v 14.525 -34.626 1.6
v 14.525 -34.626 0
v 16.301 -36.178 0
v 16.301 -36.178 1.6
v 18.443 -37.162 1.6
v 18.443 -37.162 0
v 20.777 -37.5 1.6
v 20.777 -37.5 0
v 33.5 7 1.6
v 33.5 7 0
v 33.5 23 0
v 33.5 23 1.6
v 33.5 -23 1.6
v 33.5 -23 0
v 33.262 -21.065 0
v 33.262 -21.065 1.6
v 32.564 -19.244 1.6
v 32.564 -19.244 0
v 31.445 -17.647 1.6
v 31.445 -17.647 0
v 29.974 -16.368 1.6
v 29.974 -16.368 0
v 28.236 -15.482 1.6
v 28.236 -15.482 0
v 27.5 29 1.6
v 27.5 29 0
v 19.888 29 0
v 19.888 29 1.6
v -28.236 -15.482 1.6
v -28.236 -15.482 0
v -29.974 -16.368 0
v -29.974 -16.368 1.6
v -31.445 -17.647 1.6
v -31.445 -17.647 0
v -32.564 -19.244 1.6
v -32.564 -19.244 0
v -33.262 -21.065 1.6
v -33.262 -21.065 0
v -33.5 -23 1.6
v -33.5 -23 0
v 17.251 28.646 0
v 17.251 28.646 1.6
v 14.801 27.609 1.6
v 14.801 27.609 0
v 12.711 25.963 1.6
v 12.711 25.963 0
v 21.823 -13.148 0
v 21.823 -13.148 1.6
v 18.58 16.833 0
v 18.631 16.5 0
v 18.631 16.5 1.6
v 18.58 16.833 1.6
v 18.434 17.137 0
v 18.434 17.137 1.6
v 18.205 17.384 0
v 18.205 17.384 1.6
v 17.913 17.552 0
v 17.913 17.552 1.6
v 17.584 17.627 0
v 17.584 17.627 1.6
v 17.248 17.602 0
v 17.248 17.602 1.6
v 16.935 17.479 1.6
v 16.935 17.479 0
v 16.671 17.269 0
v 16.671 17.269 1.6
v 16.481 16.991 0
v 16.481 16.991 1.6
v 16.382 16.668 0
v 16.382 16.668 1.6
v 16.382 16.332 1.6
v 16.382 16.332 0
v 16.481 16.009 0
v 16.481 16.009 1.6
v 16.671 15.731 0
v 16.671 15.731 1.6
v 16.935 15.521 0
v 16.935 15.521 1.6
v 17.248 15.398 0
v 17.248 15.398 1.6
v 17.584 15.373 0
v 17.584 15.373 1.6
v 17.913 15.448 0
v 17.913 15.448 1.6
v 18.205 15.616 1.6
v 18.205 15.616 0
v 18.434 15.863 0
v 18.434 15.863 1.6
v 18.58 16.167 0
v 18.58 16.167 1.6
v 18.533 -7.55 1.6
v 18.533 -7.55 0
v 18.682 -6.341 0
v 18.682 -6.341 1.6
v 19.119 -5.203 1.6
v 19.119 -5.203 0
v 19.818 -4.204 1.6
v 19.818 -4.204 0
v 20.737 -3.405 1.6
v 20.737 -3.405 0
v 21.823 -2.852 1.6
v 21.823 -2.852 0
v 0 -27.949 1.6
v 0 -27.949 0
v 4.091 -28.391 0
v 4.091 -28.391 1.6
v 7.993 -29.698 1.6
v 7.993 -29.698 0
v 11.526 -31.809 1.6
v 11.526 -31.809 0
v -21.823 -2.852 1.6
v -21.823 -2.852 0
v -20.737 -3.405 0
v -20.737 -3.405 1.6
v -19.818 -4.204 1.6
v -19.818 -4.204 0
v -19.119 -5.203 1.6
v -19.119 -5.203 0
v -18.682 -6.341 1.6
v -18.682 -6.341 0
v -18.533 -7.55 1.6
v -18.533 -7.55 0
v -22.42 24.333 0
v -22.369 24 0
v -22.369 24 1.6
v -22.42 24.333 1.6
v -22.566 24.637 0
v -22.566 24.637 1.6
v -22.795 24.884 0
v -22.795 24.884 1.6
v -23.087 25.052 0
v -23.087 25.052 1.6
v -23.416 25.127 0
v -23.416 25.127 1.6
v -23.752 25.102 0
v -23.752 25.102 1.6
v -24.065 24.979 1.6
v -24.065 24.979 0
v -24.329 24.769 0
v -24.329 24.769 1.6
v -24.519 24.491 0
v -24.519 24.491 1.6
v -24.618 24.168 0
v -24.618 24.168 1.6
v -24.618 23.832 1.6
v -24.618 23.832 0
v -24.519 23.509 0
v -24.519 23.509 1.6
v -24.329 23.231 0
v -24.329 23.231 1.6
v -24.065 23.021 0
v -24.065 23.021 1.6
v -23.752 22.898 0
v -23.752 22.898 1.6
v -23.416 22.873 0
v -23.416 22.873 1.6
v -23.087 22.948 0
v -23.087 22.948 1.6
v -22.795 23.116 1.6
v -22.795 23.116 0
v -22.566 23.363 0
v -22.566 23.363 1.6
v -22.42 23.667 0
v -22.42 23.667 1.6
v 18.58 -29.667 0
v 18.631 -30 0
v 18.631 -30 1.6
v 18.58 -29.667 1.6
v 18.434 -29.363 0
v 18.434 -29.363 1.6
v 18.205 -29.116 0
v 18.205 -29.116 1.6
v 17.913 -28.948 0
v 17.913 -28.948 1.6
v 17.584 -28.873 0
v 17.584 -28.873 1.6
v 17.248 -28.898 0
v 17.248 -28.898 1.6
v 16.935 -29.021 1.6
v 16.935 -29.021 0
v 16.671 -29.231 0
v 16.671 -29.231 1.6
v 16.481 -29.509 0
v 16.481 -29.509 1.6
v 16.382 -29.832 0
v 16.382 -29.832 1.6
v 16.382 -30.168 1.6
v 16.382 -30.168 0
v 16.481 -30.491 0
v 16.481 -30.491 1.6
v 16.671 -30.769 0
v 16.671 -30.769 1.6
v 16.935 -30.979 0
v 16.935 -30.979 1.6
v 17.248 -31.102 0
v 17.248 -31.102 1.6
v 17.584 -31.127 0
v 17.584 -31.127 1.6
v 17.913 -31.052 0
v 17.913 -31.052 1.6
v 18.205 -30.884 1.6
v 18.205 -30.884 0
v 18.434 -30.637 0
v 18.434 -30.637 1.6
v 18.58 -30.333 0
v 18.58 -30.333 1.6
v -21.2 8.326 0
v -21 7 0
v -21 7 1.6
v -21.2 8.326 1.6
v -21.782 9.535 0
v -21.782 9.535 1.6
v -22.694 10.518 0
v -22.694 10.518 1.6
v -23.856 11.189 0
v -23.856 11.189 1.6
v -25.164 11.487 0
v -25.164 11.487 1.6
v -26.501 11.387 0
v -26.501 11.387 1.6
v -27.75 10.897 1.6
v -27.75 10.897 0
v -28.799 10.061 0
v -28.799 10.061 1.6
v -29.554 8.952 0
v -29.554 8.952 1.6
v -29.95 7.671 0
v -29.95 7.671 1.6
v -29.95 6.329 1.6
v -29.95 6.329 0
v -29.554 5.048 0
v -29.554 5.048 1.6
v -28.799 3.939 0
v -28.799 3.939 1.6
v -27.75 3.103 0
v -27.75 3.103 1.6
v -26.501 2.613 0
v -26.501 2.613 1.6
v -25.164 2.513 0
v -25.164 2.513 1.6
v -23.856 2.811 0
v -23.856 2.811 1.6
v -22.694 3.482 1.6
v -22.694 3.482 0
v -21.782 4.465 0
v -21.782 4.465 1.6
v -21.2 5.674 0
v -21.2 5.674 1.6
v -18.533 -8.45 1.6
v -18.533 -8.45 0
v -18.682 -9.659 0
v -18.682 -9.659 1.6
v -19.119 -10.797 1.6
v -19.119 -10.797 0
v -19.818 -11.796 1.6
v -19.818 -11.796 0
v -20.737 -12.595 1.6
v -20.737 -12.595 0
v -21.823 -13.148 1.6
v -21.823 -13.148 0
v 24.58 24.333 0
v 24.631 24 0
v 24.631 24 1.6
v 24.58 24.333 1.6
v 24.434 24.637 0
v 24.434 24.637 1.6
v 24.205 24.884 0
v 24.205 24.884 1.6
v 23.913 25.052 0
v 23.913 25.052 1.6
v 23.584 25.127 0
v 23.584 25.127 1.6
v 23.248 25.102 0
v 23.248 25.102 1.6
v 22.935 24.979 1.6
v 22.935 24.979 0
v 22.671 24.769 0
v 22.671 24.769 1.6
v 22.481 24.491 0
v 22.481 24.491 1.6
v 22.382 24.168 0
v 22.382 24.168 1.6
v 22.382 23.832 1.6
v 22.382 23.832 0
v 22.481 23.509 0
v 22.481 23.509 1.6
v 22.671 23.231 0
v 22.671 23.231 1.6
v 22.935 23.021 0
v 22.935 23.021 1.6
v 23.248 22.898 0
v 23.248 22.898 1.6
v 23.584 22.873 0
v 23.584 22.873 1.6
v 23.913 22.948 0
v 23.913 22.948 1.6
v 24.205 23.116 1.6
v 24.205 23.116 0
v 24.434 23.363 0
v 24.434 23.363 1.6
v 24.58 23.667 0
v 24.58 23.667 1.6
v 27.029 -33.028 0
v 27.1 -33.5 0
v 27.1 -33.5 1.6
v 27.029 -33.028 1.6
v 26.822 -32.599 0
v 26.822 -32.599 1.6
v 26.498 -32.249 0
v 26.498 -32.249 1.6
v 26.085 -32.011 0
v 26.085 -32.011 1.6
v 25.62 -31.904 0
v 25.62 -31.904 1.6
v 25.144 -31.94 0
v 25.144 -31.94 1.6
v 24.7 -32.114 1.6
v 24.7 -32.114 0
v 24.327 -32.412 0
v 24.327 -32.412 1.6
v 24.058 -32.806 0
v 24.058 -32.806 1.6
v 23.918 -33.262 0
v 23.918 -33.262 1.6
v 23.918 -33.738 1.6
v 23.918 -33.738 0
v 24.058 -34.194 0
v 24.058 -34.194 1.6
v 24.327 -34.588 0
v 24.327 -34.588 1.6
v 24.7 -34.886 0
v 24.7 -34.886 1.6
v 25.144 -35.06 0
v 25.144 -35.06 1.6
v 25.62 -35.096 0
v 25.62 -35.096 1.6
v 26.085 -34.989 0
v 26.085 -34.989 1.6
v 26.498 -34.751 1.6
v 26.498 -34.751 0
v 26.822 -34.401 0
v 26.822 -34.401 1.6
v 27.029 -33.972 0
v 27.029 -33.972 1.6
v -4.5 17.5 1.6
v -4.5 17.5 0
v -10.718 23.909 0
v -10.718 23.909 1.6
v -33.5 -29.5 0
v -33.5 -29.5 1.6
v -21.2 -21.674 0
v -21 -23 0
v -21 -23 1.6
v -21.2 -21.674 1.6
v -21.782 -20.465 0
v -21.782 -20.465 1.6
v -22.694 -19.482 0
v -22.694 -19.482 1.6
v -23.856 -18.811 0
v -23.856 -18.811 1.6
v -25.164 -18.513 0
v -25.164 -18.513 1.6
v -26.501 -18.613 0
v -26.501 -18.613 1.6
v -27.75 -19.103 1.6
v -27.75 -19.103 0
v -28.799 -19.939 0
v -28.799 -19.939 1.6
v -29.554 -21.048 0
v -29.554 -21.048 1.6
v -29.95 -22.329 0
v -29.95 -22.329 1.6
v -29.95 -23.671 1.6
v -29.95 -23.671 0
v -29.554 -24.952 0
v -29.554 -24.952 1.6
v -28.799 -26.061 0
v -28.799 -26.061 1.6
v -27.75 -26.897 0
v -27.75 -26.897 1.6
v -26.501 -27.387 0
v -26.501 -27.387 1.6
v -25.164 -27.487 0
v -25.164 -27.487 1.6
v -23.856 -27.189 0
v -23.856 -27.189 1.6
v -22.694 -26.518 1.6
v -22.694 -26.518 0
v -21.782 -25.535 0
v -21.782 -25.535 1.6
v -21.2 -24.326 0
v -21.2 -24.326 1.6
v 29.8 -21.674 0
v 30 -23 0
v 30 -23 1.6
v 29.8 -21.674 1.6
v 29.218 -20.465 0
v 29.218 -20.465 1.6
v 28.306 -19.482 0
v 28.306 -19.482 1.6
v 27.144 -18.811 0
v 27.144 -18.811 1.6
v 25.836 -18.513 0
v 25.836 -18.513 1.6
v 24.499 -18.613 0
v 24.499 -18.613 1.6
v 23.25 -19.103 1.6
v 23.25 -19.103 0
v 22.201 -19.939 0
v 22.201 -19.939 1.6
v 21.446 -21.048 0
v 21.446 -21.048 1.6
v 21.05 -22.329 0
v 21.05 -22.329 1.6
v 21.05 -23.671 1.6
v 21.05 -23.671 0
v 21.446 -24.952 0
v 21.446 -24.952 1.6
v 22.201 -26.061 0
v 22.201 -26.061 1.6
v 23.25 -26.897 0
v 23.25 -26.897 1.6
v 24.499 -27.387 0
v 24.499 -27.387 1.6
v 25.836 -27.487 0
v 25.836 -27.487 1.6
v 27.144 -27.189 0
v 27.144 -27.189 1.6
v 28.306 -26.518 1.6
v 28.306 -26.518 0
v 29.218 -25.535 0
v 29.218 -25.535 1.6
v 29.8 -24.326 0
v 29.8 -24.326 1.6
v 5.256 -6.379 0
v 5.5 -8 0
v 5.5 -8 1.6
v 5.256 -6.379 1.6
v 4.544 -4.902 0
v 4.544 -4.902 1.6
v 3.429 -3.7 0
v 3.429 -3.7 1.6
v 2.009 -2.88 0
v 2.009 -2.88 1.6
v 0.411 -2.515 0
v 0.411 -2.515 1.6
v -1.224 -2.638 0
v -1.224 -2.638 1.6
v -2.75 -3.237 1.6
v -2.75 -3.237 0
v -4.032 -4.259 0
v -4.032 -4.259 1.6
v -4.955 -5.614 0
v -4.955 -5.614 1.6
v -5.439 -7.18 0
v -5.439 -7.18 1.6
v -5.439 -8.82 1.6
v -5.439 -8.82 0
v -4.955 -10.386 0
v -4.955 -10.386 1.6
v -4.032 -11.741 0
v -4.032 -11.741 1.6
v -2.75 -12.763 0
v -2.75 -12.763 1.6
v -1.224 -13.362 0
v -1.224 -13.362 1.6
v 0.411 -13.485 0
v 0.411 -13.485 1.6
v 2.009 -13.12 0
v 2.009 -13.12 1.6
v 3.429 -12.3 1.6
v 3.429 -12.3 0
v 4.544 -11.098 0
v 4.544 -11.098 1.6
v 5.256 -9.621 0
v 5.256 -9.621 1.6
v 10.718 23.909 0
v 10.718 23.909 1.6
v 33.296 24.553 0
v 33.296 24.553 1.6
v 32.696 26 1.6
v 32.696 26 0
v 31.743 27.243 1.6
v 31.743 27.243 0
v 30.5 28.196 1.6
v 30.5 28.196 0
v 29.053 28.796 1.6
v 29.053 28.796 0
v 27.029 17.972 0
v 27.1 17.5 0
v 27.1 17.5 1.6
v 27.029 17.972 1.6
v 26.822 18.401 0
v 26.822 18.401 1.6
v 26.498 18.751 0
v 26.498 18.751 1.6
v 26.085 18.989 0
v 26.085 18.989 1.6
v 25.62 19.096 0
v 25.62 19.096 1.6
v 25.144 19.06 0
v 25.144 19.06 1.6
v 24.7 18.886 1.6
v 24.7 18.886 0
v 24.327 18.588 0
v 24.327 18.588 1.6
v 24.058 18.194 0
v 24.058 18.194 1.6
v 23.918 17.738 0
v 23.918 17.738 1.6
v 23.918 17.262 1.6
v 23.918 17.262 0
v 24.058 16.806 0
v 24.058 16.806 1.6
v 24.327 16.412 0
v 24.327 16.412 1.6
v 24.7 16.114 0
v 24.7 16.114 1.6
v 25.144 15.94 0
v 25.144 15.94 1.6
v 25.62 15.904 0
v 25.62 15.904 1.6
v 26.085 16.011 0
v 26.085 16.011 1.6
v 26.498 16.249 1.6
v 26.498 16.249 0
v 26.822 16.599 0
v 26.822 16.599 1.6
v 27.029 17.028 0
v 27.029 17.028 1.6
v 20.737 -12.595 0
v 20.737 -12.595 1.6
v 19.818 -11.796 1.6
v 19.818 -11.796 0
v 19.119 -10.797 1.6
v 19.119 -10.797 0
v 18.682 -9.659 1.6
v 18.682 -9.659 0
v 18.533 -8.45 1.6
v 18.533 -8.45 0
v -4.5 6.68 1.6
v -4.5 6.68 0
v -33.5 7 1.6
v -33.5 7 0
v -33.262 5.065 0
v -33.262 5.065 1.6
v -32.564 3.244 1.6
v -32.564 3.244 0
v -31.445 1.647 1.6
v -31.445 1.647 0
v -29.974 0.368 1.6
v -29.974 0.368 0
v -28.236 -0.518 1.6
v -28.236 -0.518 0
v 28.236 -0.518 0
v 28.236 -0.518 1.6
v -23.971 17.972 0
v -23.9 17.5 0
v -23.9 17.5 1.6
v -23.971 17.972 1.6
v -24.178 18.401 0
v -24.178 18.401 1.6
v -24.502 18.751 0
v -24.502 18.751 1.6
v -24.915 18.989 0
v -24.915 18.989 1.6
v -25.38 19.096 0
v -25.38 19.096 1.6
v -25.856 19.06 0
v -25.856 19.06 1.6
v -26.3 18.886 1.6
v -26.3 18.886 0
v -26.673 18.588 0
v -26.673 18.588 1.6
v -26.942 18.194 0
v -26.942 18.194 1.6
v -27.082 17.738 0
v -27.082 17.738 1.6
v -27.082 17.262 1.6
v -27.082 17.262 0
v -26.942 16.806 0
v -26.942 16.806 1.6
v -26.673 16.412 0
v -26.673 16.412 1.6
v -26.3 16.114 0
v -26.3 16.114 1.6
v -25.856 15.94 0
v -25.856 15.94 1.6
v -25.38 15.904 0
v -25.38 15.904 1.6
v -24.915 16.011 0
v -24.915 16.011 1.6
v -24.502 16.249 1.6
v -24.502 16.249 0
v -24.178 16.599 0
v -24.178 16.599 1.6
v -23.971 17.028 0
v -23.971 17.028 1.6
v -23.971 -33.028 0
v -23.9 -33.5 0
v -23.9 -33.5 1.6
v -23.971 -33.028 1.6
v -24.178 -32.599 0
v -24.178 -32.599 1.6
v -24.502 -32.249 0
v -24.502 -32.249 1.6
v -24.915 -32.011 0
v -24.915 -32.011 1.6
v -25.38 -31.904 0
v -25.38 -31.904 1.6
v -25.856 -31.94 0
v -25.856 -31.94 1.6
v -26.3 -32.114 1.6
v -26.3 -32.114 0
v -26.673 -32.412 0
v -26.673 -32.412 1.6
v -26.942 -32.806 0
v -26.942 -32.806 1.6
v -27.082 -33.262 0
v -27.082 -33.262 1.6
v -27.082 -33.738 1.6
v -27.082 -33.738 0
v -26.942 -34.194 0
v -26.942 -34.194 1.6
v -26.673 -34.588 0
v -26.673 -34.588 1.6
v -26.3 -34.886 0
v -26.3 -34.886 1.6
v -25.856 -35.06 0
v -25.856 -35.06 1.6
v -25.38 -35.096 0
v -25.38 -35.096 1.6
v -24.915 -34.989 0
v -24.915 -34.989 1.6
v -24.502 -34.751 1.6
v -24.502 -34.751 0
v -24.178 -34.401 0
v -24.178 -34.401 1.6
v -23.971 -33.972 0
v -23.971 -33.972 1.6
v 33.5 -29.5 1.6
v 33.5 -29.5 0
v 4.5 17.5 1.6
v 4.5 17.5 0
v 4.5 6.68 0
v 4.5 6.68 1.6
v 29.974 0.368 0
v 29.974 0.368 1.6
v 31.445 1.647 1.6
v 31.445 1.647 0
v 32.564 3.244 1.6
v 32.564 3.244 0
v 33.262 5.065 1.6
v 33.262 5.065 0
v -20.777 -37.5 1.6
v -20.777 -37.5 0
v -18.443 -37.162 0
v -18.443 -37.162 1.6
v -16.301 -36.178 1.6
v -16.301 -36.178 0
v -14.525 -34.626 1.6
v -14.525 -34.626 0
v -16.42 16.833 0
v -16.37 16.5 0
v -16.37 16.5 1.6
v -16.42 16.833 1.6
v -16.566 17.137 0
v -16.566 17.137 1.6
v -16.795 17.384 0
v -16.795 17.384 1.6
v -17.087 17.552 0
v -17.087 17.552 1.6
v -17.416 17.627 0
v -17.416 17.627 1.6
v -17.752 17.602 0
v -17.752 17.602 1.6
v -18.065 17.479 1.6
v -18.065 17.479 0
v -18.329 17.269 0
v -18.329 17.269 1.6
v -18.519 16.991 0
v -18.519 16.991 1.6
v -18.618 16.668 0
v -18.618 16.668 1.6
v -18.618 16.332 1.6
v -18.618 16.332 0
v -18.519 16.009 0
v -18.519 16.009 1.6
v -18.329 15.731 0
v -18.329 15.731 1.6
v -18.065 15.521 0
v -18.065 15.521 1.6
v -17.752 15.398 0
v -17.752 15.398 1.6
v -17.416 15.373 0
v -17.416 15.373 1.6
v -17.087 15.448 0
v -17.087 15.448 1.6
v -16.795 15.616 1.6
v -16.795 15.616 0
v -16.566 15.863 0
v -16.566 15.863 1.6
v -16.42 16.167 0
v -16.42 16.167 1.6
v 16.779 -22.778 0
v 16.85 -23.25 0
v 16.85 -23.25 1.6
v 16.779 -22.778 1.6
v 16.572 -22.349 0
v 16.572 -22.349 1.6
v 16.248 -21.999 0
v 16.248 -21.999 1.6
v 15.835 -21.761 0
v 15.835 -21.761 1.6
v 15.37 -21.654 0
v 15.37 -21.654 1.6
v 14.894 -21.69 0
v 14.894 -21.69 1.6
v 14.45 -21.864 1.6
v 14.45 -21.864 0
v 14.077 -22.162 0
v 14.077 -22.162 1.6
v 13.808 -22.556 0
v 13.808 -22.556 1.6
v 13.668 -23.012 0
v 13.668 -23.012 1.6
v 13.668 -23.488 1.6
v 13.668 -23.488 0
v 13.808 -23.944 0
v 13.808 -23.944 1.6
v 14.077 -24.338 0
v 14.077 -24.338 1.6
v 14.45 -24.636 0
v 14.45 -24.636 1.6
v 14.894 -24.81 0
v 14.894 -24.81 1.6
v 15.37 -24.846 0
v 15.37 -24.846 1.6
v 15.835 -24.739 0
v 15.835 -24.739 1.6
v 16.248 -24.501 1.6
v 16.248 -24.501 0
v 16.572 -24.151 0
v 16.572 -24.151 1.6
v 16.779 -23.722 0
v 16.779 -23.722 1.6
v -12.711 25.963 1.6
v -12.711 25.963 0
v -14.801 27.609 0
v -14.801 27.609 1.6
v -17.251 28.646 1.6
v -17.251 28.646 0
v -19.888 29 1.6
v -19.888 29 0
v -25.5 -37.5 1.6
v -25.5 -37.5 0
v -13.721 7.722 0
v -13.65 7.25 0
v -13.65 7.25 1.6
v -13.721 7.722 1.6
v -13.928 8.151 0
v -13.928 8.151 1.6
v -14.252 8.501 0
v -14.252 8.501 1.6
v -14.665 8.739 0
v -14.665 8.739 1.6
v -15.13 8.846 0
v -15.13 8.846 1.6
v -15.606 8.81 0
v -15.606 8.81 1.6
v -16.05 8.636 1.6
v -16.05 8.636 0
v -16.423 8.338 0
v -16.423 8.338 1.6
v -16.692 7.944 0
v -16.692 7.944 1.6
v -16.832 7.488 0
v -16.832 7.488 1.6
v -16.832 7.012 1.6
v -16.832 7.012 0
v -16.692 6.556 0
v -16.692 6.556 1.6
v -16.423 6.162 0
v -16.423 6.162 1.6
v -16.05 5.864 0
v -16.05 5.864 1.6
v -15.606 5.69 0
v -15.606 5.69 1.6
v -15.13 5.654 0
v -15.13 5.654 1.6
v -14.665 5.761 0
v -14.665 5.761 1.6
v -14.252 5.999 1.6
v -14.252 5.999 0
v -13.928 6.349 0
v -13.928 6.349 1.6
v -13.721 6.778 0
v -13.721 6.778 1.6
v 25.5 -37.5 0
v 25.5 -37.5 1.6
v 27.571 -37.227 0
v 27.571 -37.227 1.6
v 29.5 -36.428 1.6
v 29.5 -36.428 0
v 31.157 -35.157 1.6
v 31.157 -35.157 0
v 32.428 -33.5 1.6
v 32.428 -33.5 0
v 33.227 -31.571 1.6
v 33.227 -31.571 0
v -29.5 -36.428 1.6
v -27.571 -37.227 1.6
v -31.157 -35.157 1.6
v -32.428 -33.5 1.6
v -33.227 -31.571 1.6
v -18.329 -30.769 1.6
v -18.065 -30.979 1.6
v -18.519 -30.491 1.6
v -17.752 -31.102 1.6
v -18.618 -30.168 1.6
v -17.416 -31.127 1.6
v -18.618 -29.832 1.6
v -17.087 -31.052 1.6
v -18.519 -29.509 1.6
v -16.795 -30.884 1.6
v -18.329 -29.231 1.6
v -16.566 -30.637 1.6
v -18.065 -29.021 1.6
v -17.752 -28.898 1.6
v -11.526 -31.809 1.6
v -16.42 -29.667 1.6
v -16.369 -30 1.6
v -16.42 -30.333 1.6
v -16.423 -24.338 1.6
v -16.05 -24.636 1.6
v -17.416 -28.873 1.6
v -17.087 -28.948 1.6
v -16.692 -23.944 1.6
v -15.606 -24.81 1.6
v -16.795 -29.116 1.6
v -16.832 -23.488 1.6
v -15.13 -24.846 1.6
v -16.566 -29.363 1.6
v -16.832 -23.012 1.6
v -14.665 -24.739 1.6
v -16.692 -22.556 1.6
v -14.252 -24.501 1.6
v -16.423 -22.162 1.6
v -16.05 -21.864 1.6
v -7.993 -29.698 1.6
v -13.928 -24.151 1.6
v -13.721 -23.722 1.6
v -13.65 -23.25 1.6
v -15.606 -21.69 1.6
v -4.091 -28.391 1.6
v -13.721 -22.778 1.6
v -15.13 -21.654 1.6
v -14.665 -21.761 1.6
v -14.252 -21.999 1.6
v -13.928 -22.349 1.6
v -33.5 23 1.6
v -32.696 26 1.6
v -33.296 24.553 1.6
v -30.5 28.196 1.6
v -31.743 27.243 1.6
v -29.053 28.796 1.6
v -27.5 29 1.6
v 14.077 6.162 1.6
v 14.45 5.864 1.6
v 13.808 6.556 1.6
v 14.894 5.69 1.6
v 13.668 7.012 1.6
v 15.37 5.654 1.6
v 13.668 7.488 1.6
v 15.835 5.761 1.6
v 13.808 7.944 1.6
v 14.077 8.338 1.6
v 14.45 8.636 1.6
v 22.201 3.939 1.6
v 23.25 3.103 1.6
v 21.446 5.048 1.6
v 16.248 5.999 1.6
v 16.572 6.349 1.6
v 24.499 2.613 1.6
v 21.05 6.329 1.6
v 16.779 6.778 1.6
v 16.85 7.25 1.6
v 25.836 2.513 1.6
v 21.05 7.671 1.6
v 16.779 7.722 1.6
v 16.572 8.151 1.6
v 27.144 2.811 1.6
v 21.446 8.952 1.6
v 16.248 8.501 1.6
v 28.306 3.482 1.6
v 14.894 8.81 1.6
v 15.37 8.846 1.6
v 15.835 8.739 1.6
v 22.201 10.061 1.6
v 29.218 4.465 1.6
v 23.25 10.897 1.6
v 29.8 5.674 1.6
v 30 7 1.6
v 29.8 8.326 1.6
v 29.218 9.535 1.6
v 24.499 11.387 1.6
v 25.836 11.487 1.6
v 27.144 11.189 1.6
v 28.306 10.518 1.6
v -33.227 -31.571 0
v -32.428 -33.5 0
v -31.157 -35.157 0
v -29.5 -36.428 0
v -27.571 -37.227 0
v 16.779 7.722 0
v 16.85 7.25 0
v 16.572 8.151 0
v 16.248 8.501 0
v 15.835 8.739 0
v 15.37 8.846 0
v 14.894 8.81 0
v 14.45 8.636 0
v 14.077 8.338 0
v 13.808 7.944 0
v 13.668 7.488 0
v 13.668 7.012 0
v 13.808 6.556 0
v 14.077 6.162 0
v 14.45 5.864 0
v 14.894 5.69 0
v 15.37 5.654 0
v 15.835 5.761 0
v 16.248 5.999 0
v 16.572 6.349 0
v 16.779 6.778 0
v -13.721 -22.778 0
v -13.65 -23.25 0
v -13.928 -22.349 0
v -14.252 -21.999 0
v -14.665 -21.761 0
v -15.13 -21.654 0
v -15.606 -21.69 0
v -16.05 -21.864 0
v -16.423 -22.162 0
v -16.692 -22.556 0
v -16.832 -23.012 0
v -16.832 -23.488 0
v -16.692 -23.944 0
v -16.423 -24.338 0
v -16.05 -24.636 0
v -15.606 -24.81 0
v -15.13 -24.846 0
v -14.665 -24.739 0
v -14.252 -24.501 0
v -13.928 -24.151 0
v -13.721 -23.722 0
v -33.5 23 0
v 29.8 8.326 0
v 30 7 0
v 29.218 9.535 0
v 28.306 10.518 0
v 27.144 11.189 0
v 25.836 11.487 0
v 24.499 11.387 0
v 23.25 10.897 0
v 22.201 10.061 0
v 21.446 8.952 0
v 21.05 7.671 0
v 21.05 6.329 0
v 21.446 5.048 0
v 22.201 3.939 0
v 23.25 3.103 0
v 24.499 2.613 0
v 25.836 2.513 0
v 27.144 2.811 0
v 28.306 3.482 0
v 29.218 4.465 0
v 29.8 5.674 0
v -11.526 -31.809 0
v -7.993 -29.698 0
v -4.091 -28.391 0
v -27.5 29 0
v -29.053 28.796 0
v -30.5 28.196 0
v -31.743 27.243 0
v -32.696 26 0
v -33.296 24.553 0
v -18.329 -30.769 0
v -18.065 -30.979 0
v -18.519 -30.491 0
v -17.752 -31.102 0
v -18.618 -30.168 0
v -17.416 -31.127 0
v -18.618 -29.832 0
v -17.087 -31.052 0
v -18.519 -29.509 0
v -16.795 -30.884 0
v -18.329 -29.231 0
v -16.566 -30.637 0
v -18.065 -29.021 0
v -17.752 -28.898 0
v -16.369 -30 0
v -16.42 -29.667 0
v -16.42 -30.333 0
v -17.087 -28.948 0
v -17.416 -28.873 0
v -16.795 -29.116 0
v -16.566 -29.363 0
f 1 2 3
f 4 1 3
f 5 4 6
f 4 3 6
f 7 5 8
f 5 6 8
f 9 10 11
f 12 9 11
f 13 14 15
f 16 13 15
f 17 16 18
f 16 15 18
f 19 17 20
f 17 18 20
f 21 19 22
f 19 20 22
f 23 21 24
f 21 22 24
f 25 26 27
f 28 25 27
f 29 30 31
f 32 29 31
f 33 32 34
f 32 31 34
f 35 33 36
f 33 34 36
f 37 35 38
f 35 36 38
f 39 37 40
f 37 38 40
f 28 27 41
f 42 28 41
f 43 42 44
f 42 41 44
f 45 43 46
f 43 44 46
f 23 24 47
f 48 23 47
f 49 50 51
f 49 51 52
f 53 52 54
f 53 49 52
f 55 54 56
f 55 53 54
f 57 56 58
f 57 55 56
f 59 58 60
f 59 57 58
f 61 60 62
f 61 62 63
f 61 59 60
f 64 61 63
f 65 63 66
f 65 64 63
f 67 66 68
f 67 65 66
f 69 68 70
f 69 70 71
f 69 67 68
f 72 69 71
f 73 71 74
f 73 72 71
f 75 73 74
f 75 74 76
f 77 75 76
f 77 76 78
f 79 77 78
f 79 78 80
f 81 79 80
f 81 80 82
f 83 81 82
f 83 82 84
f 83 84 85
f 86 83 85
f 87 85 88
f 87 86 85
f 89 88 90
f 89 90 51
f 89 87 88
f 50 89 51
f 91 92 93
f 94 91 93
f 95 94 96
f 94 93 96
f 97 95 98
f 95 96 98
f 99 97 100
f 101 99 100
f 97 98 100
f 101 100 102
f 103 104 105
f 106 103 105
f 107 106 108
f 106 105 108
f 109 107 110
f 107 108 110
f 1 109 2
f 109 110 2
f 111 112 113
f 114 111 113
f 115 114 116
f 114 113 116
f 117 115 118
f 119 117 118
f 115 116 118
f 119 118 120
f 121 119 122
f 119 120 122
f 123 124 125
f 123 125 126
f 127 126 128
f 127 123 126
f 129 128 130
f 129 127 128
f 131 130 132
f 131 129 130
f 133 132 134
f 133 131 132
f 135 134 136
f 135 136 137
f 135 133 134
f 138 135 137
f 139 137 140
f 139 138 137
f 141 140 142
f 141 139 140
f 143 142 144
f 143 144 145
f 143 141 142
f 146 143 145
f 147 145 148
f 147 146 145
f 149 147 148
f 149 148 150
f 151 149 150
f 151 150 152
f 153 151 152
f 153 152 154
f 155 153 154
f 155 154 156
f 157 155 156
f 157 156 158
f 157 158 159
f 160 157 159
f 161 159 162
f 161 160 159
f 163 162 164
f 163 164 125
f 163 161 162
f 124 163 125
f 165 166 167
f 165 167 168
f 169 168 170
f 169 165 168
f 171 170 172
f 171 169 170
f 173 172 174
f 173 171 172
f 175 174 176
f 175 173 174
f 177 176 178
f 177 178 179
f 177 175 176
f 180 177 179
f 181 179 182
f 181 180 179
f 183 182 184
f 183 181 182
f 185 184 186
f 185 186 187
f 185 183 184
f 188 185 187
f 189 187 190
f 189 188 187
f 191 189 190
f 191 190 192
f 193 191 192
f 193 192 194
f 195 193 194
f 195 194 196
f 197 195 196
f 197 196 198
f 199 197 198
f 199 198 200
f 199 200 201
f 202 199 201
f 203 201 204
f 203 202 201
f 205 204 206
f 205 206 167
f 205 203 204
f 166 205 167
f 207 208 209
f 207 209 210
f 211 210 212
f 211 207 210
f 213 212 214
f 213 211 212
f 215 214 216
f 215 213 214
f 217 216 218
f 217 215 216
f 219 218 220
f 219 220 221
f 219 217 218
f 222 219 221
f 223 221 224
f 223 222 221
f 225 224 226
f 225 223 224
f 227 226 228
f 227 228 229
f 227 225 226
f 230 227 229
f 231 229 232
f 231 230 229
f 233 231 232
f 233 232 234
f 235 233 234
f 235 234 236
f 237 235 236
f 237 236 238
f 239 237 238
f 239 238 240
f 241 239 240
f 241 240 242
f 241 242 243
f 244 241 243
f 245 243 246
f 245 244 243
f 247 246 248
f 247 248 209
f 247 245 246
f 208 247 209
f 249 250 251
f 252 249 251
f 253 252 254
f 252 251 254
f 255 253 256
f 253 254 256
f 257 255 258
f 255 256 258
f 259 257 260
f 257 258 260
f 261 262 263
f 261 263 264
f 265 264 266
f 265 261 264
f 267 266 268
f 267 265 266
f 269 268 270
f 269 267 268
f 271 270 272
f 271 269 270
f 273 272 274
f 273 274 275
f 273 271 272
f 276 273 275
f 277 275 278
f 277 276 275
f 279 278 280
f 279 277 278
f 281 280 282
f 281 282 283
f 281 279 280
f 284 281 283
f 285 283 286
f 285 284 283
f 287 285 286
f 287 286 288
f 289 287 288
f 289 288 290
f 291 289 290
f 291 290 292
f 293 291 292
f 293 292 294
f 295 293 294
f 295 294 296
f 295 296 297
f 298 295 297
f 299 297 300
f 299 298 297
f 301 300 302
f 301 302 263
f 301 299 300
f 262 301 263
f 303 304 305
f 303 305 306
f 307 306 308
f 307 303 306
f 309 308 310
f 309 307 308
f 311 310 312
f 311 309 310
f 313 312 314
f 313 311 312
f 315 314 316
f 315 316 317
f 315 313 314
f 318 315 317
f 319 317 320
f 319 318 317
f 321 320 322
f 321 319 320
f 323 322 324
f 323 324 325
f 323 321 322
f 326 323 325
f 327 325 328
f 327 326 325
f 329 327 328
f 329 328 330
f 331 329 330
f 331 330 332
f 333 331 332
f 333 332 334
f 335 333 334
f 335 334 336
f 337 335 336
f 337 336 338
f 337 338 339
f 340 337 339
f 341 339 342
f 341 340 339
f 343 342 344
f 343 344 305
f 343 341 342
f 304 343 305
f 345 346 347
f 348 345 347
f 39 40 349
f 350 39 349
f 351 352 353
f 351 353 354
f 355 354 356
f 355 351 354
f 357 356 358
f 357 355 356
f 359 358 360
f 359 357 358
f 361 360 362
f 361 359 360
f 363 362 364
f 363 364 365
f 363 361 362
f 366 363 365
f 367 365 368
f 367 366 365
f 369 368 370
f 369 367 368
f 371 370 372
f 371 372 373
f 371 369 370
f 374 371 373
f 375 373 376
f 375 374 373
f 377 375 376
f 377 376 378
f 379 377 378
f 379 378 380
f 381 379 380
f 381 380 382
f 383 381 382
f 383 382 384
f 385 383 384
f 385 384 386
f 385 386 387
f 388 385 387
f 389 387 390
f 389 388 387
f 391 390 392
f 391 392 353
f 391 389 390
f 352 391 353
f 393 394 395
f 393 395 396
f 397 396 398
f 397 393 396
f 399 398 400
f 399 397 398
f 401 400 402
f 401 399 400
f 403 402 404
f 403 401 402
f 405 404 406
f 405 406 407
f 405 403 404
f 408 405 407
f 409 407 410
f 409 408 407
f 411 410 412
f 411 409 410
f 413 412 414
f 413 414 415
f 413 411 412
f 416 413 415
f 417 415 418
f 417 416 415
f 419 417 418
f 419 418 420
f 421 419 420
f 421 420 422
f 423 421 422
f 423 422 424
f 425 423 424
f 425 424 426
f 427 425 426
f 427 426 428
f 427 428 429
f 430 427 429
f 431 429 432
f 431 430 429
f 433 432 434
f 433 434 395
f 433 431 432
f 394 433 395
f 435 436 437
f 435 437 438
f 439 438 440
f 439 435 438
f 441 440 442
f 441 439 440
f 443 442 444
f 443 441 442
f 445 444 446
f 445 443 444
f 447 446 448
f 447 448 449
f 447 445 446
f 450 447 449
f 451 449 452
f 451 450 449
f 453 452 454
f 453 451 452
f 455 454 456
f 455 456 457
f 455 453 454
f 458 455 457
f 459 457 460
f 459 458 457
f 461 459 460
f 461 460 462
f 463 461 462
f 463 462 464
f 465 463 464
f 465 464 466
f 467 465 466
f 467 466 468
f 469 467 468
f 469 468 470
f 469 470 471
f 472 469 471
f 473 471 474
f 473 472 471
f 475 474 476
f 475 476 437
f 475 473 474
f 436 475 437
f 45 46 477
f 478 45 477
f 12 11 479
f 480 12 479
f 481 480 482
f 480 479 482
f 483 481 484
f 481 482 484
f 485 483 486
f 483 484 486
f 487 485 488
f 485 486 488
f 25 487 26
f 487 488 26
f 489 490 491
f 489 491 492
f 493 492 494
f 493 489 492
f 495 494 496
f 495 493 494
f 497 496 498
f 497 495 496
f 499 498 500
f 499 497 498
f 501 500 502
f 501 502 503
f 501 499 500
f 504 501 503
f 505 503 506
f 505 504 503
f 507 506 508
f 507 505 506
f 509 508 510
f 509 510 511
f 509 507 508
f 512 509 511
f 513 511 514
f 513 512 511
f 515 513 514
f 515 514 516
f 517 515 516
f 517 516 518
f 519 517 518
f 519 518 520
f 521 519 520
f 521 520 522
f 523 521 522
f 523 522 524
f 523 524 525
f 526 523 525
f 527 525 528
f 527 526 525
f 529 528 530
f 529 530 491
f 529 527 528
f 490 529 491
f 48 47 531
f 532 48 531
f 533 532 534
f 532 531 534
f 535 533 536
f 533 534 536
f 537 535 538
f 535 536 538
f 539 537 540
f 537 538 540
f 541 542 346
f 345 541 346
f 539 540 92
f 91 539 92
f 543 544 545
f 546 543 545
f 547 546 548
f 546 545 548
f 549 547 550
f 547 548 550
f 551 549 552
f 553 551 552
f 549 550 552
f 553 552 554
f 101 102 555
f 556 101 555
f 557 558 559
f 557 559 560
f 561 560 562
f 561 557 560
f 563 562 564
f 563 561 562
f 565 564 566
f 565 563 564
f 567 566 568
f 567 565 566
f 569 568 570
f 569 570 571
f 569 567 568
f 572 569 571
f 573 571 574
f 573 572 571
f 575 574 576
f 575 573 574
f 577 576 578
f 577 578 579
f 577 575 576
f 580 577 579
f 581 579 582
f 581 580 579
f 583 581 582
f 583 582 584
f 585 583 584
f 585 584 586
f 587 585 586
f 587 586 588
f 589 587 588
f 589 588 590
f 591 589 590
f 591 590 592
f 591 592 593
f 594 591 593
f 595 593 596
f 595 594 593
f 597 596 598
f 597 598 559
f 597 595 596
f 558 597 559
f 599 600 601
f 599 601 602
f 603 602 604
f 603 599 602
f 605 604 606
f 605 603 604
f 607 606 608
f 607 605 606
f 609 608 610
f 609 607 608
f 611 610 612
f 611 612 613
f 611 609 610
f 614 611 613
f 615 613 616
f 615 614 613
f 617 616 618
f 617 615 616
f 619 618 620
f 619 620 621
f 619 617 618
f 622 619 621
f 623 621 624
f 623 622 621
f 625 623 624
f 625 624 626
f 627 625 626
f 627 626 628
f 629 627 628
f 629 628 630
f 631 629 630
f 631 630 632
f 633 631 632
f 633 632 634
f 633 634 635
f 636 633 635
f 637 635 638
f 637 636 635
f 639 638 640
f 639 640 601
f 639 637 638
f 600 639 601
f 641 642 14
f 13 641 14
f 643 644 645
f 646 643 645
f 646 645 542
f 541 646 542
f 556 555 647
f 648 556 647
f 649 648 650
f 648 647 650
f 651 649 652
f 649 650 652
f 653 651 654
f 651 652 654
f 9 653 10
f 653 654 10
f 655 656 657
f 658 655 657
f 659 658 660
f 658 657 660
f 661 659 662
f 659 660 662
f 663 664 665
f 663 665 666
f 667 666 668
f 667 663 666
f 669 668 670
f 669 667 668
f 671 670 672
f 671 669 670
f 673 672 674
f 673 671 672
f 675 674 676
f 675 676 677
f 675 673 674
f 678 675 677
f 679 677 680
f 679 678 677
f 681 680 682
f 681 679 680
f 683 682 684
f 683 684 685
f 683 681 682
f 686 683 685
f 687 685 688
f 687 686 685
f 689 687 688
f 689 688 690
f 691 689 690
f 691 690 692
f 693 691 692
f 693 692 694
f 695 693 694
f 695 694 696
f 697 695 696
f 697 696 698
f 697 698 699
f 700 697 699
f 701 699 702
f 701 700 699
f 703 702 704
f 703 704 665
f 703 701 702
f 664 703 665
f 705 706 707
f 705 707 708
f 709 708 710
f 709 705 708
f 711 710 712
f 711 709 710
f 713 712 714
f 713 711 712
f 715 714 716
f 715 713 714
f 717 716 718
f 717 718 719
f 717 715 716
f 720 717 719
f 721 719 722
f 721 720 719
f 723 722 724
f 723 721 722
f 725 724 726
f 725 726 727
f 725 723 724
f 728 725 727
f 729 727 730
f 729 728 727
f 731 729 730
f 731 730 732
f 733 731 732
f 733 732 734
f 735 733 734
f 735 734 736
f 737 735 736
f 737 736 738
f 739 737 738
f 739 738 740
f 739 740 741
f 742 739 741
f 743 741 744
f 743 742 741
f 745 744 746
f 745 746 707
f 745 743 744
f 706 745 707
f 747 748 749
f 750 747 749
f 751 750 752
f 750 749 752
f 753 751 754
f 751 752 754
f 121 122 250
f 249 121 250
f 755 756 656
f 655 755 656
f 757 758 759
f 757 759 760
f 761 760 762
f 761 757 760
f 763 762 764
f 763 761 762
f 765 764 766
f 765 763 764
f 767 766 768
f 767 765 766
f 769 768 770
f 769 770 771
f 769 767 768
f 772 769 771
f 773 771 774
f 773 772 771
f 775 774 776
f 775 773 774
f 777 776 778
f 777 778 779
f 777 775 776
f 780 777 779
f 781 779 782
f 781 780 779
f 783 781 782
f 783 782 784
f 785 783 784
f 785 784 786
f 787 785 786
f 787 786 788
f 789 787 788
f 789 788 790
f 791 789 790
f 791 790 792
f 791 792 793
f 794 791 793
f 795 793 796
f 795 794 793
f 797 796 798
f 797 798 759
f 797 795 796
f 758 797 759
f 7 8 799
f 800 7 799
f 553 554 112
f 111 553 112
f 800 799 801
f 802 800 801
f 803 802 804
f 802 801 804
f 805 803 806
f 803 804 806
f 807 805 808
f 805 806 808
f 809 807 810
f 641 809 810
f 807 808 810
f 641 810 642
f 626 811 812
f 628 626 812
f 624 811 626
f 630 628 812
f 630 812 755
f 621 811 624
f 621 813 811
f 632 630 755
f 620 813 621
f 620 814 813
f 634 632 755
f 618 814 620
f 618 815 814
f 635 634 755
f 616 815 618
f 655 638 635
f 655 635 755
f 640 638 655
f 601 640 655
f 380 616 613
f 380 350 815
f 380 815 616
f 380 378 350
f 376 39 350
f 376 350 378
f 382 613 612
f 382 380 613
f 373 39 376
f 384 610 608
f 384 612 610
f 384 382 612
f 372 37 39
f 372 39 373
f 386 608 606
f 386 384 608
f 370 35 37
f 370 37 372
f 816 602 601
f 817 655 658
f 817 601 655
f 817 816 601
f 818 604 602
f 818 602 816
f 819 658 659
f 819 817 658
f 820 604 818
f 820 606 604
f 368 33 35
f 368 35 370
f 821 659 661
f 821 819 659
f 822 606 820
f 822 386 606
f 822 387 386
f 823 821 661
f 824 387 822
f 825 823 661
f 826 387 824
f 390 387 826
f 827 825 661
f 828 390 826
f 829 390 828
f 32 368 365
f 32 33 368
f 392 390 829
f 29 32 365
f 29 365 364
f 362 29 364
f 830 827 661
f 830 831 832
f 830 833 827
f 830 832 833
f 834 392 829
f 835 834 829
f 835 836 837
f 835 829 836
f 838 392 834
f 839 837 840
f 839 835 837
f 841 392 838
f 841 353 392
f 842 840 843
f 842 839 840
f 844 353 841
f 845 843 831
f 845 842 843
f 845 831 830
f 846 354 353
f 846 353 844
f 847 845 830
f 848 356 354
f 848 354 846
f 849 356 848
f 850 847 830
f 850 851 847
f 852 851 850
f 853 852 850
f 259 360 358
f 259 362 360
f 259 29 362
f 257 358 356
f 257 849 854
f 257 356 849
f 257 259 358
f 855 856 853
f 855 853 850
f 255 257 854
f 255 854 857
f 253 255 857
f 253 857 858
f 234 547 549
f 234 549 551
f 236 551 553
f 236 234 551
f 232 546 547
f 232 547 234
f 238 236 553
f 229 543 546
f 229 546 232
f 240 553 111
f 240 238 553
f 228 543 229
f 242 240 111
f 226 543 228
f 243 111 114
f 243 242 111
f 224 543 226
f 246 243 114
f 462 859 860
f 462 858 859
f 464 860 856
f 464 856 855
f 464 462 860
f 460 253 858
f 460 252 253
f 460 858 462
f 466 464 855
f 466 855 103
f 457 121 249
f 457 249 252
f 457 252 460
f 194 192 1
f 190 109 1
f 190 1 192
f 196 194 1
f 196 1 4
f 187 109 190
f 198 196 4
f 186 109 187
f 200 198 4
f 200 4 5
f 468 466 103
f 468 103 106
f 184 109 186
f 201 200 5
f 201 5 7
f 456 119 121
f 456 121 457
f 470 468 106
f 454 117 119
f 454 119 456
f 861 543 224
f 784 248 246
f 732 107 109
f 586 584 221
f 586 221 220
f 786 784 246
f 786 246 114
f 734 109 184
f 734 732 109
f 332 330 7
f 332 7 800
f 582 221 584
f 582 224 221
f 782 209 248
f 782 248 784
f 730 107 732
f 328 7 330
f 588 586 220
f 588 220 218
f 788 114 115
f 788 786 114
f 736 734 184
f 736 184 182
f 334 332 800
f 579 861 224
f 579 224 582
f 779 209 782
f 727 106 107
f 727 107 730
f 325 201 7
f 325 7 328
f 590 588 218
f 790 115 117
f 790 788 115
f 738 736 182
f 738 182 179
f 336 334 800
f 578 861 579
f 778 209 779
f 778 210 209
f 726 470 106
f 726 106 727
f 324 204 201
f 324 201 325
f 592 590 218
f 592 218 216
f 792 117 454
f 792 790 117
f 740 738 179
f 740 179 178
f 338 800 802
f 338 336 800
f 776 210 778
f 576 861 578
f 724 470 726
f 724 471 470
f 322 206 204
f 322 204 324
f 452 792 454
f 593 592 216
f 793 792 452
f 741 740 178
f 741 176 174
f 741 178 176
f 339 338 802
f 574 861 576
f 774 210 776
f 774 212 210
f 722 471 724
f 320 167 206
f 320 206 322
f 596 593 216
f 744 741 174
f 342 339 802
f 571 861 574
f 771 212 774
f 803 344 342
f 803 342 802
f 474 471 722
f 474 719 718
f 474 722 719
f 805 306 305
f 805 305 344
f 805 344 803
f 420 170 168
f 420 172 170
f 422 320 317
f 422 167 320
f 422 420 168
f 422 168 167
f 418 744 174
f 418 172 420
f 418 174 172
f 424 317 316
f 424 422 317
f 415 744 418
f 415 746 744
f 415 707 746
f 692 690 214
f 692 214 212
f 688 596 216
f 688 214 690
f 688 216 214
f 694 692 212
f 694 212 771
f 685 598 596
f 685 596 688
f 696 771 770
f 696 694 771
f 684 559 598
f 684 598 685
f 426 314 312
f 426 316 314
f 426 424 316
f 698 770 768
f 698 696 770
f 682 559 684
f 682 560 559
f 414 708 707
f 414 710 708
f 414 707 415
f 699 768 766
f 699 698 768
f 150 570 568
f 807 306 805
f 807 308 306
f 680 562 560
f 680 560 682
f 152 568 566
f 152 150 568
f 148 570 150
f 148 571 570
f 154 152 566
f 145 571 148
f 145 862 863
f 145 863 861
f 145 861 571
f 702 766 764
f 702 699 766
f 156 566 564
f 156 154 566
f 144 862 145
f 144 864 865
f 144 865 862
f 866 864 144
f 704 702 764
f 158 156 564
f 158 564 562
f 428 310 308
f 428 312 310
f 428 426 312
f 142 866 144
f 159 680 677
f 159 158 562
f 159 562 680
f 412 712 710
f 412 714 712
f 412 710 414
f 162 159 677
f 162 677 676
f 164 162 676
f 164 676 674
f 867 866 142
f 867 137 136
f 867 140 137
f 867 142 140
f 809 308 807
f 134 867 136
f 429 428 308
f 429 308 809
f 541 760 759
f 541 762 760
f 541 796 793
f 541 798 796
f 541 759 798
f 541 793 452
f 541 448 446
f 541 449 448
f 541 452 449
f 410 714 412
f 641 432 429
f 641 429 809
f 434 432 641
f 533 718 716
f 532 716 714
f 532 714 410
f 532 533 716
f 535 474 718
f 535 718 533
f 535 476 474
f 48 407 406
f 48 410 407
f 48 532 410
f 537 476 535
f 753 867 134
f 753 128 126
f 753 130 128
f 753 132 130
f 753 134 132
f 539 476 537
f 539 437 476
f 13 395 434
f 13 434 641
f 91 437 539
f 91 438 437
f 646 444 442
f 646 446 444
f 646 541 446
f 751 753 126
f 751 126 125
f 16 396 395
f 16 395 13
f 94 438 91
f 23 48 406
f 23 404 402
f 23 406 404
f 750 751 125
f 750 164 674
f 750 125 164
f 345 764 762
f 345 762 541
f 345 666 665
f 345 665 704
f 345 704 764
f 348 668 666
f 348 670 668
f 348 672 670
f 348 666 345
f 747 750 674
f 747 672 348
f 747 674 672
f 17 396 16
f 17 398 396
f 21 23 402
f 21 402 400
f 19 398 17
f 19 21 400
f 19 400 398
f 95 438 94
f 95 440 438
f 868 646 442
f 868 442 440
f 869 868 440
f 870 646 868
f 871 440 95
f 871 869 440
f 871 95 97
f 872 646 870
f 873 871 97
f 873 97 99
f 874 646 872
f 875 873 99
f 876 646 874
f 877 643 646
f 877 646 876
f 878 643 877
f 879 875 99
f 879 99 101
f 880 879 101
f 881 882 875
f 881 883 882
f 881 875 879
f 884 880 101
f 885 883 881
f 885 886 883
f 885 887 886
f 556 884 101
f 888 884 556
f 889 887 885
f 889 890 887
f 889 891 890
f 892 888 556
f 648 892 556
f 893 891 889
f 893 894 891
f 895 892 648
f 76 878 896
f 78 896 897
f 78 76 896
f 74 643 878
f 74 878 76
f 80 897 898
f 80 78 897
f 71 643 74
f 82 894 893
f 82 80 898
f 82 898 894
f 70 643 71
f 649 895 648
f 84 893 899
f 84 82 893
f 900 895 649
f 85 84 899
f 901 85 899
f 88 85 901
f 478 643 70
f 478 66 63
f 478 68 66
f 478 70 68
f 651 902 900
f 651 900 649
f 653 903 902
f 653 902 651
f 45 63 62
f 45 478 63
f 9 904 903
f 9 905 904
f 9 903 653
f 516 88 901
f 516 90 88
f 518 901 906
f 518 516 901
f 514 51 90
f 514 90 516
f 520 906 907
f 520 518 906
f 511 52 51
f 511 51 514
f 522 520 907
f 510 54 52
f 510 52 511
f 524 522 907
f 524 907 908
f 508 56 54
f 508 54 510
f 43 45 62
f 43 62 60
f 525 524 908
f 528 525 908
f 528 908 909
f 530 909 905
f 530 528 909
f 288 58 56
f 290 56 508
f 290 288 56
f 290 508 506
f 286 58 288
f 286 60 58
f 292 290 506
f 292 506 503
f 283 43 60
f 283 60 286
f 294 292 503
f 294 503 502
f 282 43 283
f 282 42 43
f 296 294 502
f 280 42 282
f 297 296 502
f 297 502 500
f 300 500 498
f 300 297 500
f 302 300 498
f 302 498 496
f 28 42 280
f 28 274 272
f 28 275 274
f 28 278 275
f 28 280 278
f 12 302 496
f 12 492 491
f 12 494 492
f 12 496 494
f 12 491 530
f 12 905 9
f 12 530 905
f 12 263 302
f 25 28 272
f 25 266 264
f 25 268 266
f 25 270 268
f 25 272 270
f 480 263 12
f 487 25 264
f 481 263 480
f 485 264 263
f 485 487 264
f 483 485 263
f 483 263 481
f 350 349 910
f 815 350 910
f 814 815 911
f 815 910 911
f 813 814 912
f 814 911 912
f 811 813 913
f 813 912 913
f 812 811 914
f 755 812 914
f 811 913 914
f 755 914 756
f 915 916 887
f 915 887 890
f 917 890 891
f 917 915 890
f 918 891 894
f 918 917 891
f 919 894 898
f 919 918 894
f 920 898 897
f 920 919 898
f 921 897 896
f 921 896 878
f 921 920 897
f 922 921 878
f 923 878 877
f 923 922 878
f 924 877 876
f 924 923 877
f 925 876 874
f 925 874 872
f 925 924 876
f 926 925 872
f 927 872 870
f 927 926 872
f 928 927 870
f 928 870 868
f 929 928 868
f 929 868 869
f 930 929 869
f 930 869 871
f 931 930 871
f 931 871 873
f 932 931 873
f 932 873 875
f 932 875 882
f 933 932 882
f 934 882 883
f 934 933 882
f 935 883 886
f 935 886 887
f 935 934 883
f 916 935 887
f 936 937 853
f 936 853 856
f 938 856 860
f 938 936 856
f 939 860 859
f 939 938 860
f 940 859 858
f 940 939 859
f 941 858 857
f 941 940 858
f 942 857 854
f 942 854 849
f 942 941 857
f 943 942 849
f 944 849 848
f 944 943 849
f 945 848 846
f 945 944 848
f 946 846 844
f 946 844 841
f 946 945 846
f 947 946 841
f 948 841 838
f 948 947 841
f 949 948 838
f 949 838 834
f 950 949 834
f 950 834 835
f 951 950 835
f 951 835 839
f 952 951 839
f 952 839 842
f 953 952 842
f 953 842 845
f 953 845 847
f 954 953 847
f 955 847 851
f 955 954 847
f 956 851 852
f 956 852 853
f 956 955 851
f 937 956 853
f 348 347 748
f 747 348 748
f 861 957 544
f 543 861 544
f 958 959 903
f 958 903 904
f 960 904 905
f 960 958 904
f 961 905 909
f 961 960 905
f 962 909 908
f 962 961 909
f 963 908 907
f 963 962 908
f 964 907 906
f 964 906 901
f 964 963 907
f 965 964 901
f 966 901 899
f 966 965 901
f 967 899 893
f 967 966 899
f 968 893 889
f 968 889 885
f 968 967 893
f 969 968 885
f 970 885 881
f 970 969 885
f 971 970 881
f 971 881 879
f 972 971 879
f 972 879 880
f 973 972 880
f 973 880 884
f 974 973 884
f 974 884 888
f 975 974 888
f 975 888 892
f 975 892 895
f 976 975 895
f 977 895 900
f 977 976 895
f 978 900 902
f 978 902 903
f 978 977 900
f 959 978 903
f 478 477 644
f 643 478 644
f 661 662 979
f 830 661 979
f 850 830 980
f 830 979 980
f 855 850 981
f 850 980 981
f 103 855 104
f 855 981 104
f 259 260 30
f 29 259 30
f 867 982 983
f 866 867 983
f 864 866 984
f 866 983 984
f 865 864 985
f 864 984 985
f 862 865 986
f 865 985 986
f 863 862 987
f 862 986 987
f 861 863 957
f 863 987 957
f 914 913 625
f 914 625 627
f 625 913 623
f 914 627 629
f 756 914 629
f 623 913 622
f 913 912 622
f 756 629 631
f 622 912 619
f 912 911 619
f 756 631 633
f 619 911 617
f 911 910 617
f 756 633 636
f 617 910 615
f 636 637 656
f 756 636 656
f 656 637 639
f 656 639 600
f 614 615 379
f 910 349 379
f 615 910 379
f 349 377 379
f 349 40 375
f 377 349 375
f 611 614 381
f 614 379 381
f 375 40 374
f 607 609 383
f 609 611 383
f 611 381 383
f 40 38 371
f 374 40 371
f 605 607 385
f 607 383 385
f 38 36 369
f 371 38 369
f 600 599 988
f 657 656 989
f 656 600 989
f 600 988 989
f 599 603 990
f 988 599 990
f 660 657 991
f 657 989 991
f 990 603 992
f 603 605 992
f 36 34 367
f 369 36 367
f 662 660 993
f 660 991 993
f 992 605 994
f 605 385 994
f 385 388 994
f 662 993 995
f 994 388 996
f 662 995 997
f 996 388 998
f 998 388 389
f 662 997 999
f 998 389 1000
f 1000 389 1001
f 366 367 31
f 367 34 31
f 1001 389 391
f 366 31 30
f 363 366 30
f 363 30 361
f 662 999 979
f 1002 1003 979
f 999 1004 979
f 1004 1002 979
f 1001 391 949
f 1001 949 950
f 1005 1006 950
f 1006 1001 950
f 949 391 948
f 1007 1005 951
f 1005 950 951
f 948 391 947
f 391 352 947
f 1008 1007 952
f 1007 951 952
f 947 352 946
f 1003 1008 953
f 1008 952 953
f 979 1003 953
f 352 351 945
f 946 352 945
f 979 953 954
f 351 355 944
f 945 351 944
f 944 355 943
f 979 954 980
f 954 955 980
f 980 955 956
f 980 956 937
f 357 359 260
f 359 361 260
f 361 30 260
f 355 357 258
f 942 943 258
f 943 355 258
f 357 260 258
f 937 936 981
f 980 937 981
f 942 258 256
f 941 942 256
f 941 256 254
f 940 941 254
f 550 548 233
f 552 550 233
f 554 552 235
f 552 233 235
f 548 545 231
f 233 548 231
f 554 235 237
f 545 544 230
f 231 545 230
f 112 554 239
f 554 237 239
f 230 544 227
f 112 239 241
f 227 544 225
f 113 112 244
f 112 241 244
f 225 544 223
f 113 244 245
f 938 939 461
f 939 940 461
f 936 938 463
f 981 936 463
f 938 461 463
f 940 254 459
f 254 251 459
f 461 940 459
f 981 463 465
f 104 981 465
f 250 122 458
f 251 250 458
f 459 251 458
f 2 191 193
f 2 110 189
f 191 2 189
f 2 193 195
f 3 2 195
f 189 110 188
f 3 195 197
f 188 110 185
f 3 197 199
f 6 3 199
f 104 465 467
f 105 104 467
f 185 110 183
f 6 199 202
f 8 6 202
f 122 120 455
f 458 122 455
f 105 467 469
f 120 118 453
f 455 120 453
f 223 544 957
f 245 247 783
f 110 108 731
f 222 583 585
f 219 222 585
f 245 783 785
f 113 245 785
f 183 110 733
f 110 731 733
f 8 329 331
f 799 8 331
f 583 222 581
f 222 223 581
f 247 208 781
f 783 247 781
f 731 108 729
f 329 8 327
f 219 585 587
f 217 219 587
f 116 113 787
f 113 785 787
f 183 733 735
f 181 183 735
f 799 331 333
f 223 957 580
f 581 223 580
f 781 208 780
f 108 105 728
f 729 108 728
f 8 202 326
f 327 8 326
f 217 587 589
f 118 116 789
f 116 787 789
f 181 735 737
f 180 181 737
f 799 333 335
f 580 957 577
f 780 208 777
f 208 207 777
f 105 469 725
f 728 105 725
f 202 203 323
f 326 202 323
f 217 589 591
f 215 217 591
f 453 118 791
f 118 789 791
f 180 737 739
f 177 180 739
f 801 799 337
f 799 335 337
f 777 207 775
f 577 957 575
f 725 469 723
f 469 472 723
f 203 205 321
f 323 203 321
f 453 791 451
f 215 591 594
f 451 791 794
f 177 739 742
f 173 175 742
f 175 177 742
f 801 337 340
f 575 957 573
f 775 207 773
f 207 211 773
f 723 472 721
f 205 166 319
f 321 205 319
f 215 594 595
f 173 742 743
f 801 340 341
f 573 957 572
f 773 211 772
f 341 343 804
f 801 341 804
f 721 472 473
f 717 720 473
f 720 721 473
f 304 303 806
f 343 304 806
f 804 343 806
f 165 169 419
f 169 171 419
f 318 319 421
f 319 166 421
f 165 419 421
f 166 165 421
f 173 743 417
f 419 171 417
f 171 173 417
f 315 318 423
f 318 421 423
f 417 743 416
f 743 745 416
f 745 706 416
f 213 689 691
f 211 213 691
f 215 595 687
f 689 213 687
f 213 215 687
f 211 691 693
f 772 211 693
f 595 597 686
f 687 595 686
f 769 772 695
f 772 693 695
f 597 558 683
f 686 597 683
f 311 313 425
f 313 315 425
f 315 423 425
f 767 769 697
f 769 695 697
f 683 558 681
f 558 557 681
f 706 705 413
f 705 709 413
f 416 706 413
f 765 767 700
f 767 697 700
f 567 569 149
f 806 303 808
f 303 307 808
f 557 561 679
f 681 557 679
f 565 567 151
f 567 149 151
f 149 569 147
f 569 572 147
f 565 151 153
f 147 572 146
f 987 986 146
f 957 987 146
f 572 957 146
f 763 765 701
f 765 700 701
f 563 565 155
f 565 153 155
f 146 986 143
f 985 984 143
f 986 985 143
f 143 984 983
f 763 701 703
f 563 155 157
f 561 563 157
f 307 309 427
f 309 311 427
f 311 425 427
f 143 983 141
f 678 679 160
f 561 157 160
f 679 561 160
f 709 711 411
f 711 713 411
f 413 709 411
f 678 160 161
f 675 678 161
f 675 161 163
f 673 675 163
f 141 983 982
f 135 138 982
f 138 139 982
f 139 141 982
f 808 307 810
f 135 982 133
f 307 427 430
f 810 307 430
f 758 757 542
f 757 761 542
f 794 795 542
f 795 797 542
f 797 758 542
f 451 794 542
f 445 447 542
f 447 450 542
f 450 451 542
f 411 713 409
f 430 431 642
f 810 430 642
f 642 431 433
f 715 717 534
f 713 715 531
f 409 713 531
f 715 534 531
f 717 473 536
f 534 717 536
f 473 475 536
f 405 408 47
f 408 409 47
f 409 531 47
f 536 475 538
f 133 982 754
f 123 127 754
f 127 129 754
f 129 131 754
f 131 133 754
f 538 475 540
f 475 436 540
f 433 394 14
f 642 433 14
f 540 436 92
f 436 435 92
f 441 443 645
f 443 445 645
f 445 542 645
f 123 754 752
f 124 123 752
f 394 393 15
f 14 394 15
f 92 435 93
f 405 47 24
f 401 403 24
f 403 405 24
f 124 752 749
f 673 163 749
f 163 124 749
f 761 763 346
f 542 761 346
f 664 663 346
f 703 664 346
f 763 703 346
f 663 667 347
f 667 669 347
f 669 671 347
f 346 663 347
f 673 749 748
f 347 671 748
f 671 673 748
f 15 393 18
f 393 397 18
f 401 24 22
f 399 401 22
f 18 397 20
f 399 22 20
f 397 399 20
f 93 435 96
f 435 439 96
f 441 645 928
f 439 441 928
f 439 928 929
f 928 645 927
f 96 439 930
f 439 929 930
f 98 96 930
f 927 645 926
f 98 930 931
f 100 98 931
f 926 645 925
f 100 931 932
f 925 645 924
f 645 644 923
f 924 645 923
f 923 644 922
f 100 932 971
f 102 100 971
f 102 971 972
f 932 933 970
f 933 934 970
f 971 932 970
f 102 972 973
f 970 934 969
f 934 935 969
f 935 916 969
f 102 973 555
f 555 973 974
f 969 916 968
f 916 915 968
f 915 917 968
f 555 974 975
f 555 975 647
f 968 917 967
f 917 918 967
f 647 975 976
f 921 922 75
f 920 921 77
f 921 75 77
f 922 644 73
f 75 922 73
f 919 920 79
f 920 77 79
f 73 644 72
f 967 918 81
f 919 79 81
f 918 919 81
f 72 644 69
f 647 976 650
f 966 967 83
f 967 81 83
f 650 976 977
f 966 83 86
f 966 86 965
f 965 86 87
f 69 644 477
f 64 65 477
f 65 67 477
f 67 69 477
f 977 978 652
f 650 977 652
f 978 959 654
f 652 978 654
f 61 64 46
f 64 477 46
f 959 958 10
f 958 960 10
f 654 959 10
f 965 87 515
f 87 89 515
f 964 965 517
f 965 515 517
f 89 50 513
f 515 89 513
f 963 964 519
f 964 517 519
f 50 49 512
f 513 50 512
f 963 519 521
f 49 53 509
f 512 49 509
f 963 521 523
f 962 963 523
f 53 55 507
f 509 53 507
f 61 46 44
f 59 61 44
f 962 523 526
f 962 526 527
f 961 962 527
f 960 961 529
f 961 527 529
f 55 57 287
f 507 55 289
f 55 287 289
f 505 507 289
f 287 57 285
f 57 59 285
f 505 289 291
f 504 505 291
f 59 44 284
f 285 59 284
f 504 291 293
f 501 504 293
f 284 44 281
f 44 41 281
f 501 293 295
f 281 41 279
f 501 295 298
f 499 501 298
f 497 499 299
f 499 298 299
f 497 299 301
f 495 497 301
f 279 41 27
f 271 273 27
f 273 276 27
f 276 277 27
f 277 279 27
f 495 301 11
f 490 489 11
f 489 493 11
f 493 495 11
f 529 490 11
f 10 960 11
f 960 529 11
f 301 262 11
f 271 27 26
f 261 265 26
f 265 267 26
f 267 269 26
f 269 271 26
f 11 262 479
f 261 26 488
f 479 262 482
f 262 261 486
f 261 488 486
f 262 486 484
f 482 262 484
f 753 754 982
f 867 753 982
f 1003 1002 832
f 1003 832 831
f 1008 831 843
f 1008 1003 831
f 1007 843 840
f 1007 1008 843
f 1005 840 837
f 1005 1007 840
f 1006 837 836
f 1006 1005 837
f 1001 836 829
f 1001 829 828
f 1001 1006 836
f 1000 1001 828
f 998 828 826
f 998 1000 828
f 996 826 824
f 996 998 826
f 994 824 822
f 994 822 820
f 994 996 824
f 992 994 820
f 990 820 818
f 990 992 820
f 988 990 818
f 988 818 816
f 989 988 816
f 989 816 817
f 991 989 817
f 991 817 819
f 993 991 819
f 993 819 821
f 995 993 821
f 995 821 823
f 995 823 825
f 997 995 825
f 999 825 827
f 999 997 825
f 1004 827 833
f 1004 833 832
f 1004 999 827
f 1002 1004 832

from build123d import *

# Parameters (mm, degrees)
F0_R     = 1.6
F0_R_2   = 1.130501
F0_R_3   = 4.5
F0_R_4   = 5.5
F0_R_5   = 1.1305
F1_DEPTH = 1.6


with BuildPart() as f1:
    # F0 (on Top) → F1 (new body)
    with BuildSketch(Plane.XY):
        with BuildLine():
            Line((0, 6.68), (-4.5, 6.68))
            Line((-4.5, 6.68), (-4.5, 17.5))
            Line((-4.5, 17.5), (-10.717738, 23.909049))
            Line((-10.717738, 23.909049), (-12.710509, 25.963134))
            ThreePointArc((-12.710509, 25.963134), (-15.99118, 28.209543), (-19.887888, 29.000001))
            Line((-19.887888, 29.000001), (-27.5, 29.000001))
            ThreePointArc((-27.5, 29.000001), (-31.742641, 27.242641), (-33.5, 23.000001))
            Line((-33.5, 23.000001), (-33.5, 7))
            ThreePointArc((-33.5, 7), (-32.053216, 2.411389), (-28.236161, -0.517541))
            Line((-28.236161, -0.517541), (-21.823232, -2.851656))
            ThreePointArc((-21.823232, -2.851656), (-19.437572, -4.682237), (-18.533332, -7.550119))
            Line((-18.533332, -7.550119), (-18.533332, -8))
            Line((-18.533332, -8), (-18.533332, -8.449881))
            ThreePointArc((-18.533332, -8.449881), (-19.437572, -11.317763), (-21.823232, -13.148344))
            Line((-21.823232, -13.148344), (-28.236161, -15.482459))
            ThreePointArc((-28.236161, -15.482459), (-32.053216, -18.411389), (-33.5, -23))
            Line((-33.5, -23), (-33.5, -29.5))
            ThreePointArc((-33.5, -29.5), (-31.156854, -35.156854), (-25.5, -37.5))
            Line((-25.5, -37.5), (-20.777138, -37.5))
            ThreePointArc((-20.777138, -37.5), (-17.336651, -36.747083), (-14.525119, -34.625971))
            ThreePointArc((-14.525119, -34.625971), (-7.993173, -29.698059), (0, -27.94883))
            ThreePointArc((0, -27.94883), (7.993173, -29.698059), (14.525119, -34.625971))
            ThreePointArc((14.525119, -34.625971), (17.336651, -36.747083), (20.777138, -37.5))
            Line((20.777138, -37.5), (25.5, -37.5))
            ThreePointArc((25.5, -37.5), (31.156854, -35.156854), (33.5, -29.5))
            Line((33.5, -29.5), (33.5, -23))
            ThreePointArc((33.5, -23), (32.053216, -18.411389), (28.236161, -15.482459))
            Line((28.236161, -15.482459), (21.823232, -13.148344))
            ThreePointArc((21.823232, -13.148344), (19.437572, -11.317763), (18.533332, -8.449881))
            Line((18.533332, -8.449881), (18.533332, -8))
            Line((18.533332, -8), (18.533332, -7.550119))
            ThreePointArc((18.533332, -7.550119), (19.437572, -4.682237), (21.823232, -2.851656))
            Line((21.823232, -2.851656), (28.236161, -0.517541))
            ThreePointArc((28.236161, -0.517541), (32.053216, 2.411389), (33.5, 7))
            Line((33.5, 7), (33.5, 23.000001))
            ThreePointArc((33.5, 23.000001), (31.742641, 27.242641), (27.5, 29.000001))
            Line((27.5, 29.000001), (19.887888, 29.000001))
            ThreePointArc((19.887888, 29.000001), (15.99118, 28.209543), (12.710509, 25.963134))
            Line((12.710509, 25.963134), (10.717738, 23.909049))
            Line((10.717738, 23.909049), (4.5, 17.5))
            Line((4.5, 17.5), (4.5, 6.68))
            Line((4.5, 6.68), (0, 6.68))
        make_face()
        with Locations((-25.5, -33.5)):
            Circle(F0_R, mode=Mode.SUBTRACT)
        with Locations((-17.5, -30)):
            Circle(F0_R_2, mode=Mode.SUBTRACT)
        with Locations((-25.5, -23)):
            Circle(F0_R_3, mode=Mode.SUBTRACT)
        with Locations((-15.25, -23.25)):
            Circle(F0_R, mode=Mode.SUBTRACT)
        with Locations((15.25, -23.25)):
            Circle(F0_R, mode=Mode.SUBTRACT)
        with Locations((17.5, -30)):
            Circle(F0_R_2, mode=Mode.SUBTRACT)
        with Locations((25.5, -33.5)):
            Circle(F0_R, mode=Mode.SUBTRACT)
        with Locations((25.5, -23)):
            Circle(F0_R_3, mode=Mode.SUBTRACT)
        with Locations((0, -8)):
            Circle(F0_R_4, mode=Mode.SUBTRACT)
        with Locations((-25.5, 7)):
            Circle(F0_R_3, mode=Mode.SUBTRACT)
        with Locations((-15.25, 7.25)):
            Circle(F0_R, mode=Mode.SUBTRACT)
        with Locations((-25.5, 17.5)):
            Circle(F0_R, mode=Mode.SUBTRACT)
        with Locations((-17.500001, 16.5)):
            Circle(F0_R_5, mode=Mode.SUBTRACT)
        with Locations((-23.5, 24.000001)):
            Circle(F0_R_2, mode=Mode.SUBTRACT)
        with Locations((15.25, 7.25)):
            Circle(F0_R, mode=Mode.SUBTRACT)
        with Locations((25.5, 7)):
            Circle(F0_R_3, mode=Mode.SUBTRACT)
        with Locations((17.500001, 16.5)):
            Circle(F0_R_5, mode=Mode.SUBTRACT)
        with Locations((25.5, 17.5)):
            Circle(F0_R, mode=Mode.SUBTRACT)
        with Locations((23.5, 24.000001)):
            Circle(F0_R_2, mode=Mode.SUBTRACT)
    extrude(amount=F1_DEPTH)


solid = f1.part
